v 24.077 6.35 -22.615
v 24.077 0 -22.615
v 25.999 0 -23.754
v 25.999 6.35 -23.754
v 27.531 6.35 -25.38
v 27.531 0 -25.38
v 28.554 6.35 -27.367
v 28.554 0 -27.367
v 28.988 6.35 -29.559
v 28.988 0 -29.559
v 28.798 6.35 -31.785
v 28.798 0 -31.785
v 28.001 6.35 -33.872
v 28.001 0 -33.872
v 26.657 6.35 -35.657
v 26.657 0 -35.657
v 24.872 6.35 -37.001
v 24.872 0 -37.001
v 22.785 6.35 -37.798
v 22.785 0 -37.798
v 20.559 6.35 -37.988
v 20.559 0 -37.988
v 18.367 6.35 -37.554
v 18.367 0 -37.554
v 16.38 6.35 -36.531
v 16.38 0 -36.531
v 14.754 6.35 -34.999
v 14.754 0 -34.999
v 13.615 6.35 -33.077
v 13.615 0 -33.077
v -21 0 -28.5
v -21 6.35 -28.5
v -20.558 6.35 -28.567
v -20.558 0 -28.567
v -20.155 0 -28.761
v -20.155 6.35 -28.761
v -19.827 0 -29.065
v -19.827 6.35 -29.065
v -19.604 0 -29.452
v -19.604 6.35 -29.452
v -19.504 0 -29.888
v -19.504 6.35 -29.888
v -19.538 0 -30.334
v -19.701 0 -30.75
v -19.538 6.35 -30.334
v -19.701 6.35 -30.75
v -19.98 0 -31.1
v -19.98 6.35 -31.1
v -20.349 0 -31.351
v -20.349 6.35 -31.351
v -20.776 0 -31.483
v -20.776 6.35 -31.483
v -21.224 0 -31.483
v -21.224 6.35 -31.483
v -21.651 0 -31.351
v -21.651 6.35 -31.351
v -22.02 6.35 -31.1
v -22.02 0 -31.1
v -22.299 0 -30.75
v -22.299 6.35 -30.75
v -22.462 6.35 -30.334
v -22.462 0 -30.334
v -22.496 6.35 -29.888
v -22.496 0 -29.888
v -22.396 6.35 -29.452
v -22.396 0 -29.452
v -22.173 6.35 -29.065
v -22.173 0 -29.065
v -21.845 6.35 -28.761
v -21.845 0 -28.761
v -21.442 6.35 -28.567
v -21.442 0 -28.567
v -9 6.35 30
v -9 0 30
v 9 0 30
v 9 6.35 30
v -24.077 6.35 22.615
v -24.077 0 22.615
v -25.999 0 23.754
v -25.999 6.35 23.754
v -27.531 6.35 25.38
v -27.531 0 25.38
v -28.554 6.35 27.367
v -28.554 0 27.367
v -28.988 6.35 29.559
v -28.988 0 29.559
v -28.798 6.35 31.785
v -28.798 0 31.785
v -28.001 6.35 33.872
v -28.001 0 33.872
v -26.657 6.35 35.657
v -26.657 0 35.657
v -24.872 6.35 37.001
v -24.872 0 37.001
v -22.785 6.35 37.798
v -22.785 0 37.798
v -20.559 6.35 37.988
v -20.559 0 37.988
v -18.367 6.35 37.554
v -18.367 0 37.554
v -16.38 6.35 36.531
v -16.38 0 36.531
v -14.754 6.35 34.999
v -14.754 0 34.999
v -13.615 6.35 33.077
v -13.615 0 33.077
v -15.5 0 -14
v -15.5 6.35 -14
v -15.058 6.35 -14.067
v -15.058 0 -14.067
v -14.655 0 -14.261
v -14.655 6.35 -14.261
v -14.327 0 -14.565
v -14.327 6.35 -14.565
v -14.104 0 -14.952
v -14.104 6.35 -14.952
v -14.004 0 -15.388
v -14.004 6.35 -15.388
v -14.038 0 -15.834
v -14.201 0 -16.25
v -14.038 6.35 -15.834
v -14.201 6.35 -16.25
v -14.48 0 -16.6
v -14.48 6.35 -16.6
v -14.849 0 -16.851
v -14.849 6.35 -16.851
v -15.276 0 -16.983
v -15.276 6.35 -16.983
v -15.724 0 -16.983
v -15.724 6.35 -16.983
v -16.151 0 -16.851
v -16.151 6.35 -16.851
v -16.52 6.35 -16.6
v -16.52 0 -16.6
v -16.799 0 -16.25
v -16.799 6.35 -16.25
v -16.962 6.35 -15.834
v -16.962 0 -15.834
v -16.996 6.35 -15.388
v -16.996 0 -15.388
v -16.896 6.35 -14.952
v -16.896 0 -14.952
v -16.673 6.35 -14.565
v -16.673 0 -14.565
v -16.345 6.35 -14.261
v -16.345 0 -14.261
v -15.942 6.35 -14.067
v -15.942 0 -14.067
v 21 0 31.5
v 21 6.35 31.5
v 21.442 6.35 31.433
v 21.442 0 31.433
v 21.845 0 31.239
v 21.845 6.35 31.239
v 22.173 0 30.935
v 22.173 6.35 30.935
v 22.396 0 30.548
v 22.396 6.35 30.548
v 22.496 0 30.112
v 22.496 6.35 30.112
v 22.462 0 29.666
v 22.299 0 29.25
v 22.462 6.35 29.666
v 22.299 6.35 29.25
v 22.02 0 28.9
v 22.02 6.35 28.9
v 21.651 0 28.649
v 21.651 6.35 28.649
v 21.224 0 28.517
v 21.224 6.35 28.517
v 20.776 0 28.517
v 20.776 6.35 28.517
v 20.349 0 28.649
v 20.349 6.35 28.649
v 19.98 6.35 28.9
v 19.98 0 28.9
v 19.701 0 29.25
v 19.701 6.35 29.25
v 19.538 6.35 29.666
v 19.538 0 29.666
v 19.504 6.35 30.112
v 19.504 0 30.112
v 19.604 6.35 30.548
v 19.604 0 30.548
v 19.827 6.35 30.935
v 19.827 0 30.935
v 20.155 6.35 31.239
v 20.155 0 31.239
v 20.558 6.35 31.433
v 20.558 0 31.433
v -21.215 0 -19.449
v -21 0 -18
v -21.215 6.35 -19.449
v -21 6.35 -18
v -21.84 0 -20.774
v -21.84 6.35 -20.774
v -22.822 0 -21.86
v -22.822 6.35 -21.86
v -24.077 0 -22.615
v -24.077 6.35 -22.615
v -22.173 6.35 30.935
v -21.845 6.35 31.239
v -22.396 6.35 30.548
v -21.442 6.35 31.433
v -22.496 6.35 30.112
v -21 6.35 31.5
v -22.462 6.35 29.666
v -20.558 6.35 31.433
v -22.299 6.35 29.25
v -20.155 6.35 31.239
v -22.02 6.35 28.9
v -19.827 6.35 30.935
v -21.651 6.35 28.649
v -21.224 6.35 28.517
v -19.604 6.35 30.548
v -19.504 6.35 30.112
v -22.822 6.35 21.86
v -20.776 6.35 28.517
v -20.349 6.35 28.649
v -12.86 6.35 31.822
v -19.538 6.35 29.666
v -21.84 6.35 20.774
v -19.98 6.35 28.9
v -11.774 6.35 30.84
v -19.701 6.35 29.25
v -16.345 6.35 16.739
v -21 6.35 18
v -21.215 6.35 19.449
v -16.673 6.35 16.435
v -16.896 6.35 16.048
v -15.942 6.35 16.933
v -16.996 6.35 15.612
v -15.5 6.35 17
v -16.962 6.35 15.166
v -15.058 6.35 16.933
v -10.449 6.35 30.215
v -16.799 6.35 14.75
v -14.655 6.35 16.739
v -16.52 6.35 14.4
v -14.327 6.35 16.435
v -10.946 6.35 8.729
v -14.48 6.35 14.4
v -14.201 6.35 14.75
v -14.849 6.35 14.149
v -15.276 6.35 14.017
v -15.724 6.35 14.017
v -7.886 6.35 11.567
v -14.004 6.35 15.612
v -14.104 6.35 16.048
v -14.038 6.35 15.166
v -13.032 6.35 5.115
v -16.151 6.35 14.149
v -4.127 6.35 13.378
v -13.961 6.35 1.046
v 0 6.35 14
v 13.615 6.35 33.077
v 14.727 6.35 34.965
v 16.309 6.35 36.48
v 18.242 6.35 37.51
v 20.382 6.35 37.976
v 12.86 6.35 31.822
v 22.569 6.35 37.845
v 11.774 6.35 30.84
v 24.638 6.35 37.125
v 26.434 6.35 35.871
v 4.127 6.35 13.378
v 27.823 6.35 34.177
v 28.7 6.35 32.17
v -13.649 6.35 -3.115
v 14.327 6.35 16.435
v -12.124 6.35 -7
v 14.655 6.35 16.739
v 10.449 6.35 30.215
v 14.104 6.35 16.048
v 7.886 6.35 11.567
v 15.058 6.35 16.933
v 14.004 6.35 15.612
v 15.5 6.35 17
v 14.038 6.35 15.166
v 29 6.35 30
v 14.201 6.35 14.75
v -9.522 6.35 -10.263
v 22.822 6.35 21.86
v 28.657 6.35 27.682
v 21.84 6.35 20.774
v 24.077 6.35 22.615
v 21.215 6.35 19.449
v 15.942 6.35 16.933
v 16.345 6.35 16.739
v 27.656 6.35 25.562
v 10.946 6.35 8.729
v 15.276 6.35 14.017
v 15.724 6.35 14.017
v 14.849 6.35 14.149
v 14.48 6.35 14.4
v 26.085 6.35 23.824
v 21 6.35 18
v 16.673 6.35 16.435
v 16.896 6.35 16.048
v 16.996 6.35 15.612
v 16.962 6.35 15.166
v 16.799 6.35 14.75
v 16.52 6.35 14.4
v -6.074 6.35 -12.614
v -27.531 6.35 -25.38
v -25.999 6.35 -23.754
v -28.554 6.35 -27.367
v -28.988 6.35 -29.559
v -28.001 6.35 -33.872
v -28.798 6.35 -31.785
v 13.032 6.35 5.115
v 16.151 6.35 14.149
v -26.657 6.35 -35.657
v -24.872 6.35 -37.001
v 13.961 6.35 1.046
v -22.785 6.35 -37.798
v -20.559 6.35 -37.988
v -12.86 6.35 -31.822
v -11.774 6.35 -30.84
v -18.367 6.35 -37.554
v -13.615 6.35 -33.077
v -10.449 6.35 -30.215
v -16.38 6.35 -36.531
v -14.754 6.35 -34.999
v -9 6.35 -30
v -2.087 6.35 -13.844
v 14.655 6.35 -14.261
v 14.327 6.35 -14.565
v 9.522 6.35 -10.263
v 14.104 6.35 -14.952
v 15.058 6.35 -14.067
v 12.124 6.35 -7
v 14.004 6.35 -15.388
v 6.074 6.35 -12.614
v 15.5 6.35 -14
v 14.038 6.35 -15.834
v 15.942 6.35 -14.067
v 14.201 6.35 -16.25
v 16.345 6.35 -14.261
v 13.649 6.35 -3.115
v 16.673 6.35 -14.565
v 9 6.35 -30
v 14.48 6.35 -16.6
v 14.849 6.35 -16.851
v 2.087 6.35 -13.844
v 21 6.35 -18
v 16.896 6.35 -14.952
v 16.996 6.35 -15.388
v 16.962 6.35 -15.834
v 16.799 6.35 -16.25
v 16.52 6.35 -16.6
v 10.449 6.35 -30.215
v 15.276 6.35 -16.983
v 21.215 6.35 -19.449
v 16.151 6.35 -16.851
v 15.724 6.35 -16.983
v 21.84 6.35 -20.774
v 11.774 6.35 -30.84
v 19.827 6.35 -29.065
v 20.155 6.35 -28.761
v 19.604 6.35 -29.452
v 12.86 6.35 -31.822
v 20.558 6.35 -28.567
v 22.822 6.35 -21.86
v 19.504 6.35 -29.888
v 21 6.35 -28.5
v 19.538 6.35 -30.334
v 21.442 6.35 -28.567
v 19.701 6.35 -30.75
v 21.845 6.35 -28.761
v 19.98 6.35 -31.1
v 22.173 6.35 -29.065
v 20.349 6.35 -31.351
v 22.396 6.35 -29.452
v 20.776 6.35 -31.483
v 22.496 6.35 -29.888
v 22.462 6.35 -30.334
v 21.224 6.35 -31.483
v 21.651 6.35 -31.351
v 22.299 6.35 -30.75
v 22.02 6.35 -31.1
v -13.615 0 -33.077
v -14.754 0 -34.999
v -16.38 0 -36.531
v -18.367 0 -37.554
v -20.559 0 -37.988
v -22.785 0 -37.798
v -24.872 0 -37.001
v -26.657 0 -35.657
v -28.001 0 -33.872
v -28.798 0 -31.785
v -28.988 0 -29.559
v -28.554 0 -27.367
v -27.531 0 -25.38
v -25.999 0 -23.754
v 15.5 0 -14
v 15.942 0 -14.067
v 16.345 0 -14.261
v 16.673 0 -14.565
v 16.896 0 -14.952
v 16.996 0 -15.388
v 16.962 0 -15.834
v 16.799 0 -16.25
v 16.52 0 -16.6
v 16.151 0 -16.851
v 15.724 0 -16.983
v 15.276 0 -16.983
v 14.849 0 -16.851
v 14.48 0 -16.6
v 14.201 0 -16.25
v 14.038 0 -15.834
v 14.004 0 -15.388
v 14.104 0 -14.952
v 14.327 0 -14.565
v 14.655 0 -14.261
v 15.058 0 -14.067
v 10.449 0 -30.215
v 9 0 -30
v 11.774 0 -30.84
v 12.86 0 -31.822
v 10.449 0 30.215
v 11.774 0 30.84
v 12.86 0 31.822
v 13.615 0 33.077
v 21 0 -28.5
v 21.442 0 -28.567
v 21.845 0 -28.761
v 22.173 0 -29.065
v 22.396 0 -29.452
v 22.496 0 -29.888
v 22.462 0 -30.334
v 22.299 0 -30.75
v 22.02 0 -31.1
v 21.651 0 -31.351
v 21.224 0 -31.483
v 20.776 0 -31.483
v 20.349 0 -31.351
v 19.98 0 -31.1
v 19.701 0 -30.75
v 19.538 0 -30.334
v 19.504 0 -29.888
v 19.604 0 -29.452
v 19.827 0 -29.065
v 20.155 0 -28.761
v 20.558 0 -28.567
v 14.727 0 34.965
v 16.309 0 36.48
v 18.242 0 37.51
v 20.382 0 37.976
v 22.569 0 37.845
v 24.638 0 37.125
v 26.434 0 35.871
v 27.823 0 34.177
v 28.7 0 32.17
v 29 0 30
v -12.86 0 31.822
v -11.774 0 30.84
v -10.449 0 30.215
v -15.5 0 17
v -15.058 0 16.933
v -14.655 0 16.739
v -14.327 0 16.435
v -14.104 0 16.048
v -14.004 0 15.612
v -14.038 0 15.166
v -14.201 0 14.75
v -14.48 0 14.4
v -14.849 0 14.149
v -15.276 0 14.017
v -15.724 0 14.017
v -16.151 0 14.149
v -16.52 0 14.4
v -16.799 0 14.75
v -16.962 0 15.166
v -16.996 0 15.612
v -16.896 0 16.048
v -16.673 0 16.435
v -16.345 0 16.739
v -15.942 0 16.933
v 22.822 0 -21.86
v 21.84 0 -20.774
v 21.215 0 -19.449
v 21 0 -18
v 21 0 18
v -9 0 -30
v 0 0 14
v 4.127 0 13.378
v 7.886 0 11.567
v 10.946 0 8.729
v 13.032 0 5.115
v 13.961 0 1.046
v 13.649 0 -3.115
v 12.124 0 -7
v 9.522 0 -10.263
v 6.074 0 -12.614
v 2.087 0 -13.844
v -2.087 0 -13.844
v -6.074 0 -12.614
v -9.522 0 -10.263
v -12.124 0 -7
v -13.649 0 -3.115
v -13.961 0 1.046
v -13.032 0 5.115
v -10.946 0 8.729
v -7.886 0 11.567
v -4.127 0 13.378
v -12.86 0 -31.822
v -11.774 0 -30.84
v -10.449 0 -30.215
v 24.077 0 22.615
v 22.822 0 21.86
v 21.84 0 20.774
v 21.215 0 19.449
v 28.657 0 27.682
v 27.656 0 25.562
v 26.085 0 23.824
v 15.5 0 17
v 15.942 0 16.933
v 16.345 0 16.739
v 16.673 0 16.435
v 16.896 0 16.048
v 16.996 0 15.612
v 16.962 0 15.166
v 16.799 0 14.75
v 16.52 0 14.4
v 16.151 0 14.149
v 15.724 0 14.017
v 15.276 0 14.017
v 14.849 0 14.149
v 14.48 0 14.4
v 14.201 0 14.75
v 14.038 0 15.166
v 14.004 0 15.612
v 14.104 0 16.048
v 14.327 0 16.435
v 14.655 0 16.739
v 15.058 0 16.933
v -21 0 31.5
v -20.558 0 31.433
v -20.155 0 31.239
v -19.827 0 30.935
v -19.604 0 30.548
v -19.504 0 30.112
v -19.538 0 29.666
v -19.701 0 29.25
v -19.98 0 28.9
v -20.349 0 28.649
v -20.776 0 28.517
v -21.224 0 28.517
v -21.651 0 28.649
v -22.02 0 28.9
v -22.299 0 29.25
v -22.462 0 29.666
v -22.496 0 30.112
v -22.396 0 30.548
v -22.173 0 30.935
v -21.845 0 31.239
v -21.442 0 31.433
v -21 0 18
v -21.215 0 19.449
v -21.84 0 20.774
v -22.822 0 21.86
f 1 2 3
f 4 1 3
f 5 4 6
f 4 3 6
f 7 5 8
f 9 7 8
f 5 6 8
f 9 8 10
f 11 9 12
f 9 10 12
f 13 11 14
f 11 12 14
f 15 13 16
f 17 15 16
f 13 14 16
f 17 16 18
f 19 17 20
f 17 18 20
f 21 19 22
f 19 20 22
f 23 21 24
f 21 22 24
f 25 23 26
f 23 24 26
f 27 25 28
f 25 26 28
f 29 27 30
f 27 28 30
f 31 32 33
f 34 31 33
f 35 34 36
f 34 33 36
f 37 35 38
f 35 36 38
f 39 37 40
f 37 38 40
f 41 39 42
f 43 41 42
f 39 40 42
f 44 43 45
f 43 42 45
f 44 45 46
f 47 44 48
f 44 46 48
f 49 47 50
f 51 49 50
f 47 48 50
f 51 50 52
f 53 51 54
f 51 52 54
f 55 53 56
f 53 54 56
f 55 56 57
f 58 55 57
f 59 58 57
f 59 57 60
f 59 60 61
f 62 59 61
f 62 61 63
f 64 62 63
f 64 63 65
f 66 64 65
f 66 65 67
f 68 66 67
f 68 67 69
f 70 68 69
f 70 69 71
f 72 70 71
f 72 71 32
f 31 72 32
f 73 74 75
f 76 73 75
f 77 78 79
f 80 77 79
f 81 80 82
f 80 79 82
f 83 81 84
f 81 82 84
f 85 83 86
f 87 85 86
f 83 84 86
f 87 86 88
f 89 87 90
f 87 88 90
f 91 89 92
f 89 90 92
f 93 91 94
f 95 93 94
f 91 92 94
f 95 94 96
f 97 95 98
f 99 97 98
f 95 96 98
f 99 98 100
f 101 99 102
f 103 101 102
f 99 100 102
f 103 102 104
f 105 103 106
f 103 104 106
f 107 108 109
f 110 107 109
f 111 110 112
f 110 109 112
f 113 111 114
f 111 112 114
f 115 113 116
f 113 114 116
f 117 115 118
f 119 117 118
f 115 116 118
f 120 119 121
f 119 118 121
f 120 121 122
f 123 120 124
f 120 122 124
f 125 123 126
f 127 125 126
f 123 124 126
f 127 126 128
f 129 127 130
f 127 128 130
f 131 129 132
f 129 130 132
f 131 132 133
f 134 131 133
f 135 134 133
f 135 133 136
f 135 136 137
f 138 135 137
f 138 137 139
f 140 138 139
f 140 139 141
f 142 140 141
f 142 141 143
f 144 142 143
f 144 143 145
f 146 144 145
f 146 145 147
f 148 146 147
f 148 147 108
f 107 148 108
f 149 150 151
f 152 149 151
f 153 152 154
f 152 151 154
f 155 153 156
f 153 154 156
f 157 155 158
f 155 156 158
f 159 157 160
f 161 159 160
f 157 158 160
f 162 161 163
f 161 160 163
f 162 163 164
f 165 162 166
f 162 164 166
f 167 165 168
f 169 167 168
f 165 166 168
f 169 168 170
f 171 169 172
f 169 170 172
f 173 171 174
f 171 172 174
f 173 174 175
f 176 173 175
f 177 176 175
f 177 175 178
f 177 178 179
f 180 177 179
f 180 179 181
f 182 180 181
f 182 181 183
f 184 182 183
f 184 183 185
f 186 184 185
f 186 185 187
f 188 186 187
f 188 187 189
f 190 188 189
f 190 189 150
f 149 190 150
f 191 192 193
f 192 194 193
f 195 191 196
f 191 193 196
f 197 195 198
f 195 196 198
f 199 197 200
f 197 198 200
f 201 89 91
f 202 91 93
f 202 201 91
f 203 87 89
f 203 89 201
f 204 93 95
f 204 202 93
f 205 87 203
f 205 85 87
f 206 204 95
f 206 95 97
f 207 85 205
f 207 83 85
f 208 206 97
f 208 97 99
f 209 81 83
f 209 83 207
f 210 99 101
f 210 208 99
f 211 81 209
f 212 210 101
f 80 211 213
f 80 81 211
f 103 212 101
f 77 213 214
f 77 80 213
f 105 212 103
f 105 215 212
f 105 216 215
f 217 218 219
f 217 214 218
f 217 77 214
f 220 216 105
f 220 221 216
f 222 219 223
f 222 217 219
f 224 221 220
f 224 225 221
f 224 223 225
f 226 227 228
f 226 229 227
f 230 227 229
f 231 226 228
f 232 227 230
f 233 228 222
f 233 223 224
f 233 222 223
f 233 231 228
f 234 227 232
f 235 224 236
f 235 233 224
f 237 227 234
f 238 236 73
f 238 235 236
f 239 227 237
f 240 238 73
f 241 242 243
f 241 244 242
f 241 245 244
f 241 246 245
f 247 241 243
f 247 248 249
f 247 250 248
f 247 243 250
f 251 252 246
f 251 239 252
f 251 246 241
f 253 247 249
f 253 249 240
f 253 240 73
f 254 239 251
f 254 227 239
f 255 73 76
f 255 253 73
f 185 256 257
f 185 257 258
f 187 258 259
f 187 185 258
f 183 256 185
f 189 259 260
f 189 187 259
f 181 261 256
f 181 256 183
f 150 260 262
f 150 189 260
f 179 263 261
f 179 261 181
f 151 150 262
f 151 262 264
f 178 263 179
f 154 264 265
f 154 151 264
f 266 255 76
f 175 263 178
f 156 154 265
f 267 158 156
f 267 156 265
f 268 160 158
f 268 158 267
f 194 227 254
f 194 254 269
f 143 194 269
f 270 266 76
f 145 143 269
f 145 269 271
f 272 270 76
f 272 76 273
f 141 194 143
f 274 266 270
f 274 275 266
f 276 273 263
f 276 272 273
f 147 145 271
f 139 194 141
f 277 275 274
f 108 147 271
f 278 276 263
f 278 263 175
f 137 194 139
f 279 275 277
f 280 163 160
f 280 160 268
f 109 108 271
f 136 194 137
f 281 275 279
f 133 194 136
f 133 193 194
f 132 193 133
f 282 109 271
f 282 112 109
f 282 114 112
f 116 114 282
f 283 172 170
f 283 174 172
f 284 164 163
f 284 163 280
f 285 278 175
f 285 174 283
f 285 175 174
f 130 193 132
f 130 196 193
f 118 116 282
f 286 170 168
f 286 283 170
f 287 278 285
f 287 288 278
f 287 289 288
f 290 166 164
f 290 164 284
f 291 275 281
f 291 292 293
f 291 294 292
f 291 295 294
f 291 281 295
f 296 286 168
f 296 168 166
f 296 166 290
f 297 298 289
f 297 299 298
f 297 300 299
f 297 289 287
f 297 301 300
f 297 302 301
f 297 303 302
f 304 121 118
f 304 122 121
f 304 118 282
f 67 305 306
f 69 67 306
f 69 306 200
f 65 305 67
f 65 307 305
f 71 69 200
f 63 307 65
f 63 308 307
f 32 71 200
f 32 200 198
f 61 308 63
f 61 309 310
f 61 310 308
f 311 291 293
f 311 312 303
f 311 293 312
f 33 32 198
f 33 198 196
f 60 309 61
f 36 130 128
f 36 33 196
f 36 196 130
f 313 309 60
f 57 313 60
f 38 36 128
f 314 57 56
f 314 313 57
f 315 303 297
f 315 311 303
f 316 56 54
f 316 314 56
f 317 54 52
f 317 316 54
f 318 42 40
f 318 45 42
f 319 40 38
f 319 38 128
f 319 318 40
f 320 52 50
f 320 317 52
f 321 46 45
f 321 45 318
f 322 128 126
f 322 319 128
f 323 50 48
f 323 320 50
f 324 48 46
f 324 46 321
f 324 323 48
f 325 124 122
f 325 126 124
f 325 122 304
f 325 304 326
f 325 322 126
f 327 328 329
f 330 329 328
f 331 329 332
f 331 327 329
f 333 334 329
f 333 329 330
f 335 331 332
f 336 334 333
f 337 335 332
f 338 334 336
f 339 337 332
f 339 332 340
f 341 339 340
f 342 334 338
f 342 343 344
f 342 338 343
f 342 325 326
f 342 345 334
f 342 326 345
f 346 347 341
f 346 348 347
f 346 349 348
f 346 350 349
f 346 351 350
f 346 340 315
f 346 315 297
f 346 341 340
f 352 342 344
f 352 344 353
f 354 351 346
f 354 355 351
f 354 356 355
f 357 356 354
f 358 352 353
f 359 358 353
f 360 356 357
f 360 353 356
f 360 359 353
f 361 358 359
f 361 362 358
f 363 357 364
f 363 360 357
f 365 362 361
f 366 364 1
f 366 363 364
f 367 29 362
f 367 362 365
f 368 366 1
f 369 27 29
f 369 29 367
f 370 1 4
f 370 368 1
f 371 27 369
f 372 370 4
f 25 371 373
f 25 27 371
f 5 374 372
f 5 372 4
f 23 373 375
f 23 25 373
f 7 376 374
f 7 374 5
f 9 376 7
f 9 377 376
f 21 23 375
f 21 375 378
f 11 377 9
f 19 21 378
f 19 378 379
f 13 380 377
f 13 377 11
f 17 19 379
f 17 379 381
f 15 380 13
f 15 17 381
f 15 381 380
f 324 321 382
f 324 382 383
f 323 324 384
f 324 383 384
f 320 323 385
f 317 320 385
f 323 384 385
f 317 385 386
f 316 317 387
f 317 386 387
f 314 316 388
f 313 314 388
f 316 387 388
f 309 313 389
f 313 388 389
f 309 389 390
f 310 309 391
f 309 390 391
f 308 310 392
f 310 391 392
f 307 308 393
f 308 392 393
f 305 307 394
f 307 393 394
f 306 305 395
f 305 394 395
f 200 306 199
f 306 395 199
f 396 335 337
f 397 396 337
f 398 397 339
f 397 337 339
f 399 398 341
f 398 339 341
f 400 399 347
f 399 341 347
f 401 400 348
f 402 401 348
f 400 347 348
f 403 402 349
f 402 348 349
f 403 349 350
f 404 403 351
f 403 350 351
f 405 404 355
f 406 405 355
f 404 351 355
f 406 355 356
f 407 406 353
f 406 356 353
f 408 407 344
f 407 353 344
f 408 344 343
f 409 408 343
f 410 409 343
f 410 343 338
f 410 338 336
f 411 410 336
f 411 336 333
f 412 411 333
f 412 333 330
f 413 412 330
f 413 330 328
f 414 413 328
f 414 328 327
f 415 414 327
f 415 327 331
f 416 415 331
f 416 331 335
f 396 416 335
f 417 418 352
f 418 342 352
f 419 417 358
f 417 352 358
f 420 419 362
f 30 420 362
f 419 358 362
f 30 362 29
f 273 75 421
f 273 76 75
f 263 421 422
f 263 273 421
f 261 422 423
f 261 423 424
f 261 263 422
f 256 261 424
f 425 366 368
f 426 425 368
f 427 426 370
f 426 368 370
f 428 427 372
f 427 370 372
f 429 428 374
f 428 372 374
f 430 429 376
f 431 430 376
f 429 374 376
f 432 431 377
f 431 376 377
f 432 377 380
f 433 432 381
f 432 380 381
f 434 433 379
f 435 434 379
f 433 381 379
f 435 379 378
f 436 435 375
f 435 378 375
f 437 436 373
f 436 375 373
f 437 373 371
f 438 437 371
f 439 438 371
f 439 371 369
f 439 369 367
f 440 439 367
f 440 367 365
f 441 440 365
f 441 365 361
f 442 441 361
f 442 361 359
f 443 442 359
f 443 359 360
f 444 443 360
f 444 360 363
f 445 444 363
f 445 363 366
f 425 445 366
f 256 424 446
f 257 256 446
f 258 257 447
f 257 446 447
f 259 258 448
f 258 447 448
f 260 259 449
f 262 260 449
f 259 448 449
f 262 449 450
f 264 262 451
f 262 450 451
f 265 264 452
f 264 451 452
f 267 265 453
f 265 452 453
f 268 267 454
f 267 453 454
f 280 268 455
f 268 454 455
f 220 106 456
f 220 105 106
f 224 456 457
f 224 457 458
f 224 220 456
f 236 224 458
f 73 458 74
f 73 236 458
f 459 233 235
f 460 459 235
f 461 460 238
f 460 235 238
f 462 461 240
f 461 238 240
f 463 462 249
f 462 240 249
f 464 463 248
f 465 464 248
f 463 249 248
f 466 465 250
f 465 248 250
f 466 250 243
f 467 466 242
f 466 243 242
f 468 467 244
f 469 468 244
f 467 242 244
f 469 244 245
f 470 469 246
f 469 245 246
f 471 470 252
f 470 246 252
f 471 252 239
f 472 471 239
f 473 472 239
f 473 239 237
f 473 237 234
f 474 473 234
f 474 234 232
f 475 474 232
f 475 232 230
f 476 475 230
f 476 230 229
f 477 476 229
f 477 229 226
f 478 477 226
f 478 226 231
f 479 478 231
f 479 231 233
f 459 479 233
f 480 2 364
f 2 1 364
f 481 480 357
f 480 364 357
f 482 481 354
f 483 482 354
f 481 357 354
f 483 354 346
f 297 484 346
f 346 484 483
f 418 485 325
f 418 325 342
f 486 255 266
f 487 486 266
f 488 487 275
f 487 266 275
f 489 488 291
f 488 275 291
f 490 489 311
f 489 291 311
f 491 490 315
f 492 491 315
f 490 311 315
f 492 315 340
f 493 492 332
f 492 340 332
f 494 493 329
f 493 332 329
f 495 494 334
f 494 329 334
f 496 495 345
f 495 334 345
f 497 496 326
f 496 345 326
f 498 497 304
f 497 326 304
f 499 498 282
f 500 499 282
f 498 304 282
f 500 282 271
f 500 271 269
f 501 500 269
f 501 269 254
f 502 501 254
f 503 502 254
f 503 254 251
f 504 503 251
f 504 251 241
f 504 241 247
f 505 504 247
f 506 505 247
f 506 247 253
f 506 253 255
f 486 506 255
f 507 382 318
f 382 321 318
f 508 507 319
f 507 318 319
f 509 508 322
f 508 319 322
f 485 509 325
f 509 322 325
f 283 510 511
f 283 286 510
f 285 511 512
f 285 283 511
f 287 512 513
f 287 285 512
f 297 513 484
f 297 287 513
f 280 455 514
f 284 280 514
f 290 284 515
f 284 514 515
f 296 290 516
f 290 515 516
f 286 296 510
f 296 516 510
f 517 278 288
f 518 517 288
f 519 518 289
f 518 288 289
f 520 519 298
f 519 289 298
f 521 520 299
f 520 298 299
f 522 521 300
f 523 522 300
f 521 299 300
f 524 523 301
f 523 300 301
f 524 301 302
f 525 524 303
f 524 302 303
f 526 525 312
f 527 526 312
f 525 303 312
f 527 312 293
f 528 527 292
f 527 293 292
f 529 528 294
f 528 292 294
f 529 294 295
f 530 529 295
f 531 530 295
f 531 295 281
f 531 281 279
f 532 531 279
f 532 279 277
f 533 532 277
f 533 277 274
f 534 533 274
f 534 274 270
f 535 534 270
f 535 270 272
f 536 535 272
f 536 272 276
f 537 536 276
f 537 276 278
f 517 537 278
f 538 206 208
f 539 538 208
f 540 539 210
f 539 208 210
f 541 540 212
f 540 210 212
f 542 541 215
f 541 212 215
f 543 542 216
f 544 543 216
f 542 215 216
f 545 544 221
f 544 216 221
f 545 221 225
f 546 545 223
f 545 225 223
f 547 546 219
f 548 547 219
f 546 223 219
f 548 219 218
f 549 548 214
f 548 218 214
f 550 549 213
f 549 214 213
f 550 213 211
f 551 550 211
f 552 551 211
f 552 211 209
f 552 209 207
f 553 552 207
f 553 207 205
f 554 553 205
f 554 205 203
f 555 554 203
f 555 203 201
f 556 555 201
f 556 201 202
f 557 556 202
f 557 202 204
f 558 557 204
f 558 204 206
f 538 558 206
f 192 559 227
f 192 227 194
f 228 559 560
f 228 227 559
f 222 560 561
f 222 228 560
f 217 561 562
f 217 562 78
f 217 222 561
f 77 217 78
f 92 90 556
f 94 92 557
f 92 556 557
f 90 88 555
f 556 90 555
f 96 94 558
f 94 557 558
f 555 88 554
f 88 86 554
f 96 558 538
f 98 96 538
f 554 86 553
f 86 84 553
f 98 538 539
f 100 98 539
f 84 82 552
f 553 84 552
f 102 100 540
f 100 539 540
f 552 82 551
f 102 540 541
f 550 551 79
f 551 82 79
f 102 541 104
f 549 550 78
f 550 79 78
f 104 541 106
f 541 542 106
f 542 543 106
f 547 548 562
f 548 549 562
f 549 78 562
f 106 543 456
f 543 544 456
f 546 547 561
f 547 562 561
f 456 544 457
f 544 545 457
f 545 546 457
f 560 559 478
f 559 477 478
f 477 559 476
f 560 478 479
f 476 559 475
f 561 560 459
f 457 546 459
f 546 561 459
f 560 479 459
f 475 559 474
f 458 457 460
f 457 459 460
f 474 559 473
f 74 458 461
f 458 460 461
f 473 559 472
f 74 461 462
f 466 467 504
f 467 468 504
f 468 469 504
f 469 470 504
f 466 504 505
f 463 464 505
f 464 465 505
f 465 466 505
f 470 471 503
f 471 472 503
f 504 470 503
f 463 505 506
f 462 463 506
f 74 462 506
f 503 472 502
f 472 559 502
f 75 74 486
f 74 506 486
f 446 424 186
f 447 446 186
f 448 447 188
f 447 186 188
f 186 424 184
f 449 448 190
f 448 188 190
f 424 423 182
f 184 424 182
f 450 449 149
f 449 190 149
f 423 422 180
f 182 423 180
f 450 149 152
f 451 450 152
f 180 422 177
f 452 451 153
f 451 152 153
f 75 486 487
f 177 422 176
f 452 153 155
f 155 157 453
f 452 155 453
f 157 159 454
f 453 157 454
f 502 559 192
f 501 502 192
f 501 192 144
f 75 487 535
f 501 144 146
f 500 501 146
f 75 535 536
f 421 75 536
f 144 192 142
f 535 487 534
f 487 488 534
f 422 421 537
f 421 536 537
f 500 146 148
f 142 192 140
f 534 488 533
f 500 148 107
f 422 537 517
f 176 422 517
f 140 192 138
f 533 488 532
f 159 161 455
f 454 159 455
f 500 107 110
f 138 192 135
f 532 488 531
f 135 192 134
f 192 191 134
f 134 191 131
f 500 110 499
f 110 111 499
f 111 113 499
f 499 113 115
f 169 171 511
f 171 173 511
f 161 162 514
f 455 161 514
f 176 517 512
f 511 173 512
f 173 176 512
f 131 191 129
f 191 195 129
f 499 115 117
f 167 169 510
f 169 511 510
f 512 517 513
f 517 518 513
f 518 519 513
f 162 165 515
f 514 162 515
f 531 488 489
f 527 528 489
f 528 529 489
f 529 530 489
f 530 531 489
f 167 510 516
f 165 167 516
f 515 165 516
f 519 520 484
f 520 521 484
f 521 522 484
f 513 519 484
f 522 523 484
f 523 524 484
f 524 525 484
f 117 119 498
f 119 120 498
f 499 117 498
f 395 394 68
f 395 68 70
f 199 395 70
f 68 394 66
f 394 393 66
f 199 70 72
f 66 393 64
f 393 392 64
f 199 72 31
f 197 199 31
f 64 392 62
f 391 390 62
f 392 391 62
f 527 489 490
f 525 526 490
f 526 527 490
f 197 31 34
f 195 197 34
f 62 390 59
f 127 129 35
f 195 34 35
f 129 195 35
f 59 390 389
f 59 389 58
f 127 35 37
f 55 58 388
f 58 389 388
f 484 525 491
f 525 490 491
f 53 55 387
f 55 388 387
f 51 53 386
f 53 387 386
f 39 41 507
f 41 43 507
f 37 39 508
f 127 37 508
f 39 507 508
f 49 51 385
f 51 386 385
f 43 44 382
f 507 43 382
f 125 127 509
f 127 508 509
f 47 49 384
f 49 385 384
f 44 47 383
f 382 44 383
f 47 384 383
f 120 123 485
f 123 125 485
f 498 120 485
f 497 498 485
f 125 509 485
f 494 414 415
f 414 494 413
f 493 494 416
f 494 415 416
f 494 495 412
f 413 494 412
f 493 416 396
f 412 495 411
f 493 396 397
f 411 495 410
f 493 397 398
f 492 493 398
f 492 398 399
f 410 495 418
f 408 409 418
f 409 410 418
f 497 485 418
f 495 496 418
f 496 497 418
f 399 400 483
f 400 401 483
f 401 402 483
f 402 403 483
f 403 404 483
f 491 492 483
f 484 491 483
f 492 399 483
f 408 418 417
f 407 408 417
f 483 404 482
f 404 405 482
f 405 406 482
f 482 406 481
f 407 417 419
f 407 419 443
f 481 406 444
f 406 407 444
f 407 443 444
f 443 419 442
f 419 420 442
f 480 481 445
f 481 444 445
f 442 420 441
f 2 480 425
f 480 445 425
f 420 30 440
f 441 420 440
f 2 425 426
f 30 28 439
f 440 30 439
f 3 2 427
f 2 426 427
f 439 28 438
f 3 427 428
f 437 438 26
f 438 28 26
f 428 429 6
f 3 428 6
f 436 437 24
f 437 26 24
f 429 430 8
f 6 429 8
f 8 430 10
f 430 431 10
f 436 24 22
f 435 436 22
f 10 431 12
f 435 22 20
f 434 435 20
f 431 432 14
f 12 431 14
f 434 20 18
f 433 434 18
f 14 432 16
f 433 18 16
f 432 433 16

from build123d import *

# Parameters (mm, degrees)
SKETCH1_R           = 8
SKETCH1_W           = 42
SKETCH1_H           = 60
BOSS_EXTRUDE1_DEPTH = 6.35
SKETCH2_R           = 1.5
SKETCH2_R_2         = 14
CUT_EXTRUDE1_DEPTH  = 49.221597858
SKETCH3_R           = 1.5
CUT_EXTRUDE2_DEPTH  = 49.221597858
FILLET1_R           = 5


with BuildPart() as part:
    # Sketch1 → Boss-Extrude1 (new body)
    with BuildSketch(Plane(origin=(0, 0, 0), x_dir=(1, 0, 0), z_dir=(0, 1, 0))):
        with BuildLine():
            ThreePointArc((-21, -22), (-26.656854249, -35.656854249), (-13, -30))
            Line((-13, -30), (-21, -30))
            Line((-21, -30), (-21, -22))
        make_face()
        with BuildLine():
            Line((-21, -30), (-13, -30))
            ThreePointArc((-13, -30), (-15.343145751, -24.343145751), (-21, -22))
            Line((-21, -22), (-21, -30))
        make_face()
        with BuildLine():
            ThreePointArc((21, -22), (15.343145751, -24.343145751), (13, -30))
            Line((13, -30), (21, -30))
            Line((21, -30), (21, -22))
        make_face()
        with BuildLine():
            Line((21, -30), (13, -30))
            ThreePointArc((13, -30), (21, -38), (29, -30))
            ThreePointArc((29, -30), (26.656854249, -24.343145751), (21, -22))
            Line((21, -22), (21, -30))
        make_face()
        with Locations((21, -30)):
            Circle(SKETCH1_R)
        with Locations((21, 30)):
            Circle(SKETCH1_R)
        with Locations((-21, 30)):
            Circle(SKETCH1_R)
        with Locations((-21, -30)):
            Circle(SKETCH1_R)
        Rectangle(SKETCH1_W, SKETCH1_H)
        with BuildLine():
            ThreePointArc((13, 30), (15.343145751, 24.343145751), (21, 22))
            Line((21, 22), (21, 30))
            Line((21, 30), (13, 30))
        make_face()
        with BuildLine():
            Line((21, 30), (21, 22))
            ThreePointArc((21, 22), (26.656854249, 24.343145751), (29, 30))
            ThreePointArc((29, 30), (21, 38), (13, 30))
            Line((13, 30), (21, 30))
        make_face()
        with BuildLine():
            ThreePointArc((-13, 30), (-26.656854249, 35.656854249), (-21, 22))
            Line((-21, 22), (-21, 30))
            Line((-21, 30), (-13, 30))
        make_face()
        with BuildLine():
            Line((-21, 30), (-21, 22))
            ThreePointArc((-21, 22), (-15.343145751, 24.343145751), (-13, 30))
            Line((-13, 30), (-21, 30))
        make_face()
    extrude(amount=BOSS_EXTRUDE1_DEPTH)

    # Sketch2 → Cut-Extrude1 (cut, through all)
    with BuildSketch(Plane(origin=(0, 6.35, 0), x_dir=(1, 0, 0), z_dir=(0, 1, 0))):
        with Locations(Location((-15.5, -15.5, 0), (0, 0, 270))):
            Circle(SKETCH2_R)
        with Locations(Location((15.5, -15.5, 0), (0, 0, 270))):
            Circle(SKETCH2_R)
        with Locations(Location((15.5, 15.5, 0), (0, 0, 270))):
            Circle(SKETCH2_R)
        with Locations(Location((-15.5, 15.5, 0), (0, 0, 270))):
            Circle(SKETCH2_R)
        with Locations(Location((0, 0, 0), (0, 0, 270))):
            Circle(SKETCH2_R_2)
    extrude(amount=-CUT_EXTRUDE1_DEPTH, mode=Mode.SUBTRACT)

    # Sketch3 → Cut-Extrude2 (cut, through all)
    with BuildSketch(Plane(origin=(0, 6.35, 0), x_dir=(1, 0, 0), z_dir=(0, 1, 0))):
        with Locations(Location((-21, 30, 0), (0, 0, 270))):
            Circle(SKETCH3_R)
        with Locations(Location((21, 30, 0), (0, 0, 270))):
            Circle(SKETCH3_R)
        with Locations(Location((21, -30, 0), (0, 0, 270))):
            Circle(SKETCH3_R)
        with Locations(Location((-21, -30, 0), (0, 0, 270))):
            Circle(SKETCH3_R)
    extrude(amount=-CUT_EXTRUDE2_DEPTH, mode=Mode.SUBTRACT)

    # Fillet1
    fillet1_edges = [part.edges().sort_by_distance(p)[0] for p in [
        (13, 3.175, 30),
        (-13, 3.175, 30),
        (-21, 3.175, 22),
        (-21, 3.175, -22),
        (-13, 3.175, -30),
        (13, 3.175, -30),
        (21, 3.175, -22),
        (21, 3.175, 22),
    ]]
    fillet(fillet1_edges, radius=FILLET1_R)


solid = part.part
